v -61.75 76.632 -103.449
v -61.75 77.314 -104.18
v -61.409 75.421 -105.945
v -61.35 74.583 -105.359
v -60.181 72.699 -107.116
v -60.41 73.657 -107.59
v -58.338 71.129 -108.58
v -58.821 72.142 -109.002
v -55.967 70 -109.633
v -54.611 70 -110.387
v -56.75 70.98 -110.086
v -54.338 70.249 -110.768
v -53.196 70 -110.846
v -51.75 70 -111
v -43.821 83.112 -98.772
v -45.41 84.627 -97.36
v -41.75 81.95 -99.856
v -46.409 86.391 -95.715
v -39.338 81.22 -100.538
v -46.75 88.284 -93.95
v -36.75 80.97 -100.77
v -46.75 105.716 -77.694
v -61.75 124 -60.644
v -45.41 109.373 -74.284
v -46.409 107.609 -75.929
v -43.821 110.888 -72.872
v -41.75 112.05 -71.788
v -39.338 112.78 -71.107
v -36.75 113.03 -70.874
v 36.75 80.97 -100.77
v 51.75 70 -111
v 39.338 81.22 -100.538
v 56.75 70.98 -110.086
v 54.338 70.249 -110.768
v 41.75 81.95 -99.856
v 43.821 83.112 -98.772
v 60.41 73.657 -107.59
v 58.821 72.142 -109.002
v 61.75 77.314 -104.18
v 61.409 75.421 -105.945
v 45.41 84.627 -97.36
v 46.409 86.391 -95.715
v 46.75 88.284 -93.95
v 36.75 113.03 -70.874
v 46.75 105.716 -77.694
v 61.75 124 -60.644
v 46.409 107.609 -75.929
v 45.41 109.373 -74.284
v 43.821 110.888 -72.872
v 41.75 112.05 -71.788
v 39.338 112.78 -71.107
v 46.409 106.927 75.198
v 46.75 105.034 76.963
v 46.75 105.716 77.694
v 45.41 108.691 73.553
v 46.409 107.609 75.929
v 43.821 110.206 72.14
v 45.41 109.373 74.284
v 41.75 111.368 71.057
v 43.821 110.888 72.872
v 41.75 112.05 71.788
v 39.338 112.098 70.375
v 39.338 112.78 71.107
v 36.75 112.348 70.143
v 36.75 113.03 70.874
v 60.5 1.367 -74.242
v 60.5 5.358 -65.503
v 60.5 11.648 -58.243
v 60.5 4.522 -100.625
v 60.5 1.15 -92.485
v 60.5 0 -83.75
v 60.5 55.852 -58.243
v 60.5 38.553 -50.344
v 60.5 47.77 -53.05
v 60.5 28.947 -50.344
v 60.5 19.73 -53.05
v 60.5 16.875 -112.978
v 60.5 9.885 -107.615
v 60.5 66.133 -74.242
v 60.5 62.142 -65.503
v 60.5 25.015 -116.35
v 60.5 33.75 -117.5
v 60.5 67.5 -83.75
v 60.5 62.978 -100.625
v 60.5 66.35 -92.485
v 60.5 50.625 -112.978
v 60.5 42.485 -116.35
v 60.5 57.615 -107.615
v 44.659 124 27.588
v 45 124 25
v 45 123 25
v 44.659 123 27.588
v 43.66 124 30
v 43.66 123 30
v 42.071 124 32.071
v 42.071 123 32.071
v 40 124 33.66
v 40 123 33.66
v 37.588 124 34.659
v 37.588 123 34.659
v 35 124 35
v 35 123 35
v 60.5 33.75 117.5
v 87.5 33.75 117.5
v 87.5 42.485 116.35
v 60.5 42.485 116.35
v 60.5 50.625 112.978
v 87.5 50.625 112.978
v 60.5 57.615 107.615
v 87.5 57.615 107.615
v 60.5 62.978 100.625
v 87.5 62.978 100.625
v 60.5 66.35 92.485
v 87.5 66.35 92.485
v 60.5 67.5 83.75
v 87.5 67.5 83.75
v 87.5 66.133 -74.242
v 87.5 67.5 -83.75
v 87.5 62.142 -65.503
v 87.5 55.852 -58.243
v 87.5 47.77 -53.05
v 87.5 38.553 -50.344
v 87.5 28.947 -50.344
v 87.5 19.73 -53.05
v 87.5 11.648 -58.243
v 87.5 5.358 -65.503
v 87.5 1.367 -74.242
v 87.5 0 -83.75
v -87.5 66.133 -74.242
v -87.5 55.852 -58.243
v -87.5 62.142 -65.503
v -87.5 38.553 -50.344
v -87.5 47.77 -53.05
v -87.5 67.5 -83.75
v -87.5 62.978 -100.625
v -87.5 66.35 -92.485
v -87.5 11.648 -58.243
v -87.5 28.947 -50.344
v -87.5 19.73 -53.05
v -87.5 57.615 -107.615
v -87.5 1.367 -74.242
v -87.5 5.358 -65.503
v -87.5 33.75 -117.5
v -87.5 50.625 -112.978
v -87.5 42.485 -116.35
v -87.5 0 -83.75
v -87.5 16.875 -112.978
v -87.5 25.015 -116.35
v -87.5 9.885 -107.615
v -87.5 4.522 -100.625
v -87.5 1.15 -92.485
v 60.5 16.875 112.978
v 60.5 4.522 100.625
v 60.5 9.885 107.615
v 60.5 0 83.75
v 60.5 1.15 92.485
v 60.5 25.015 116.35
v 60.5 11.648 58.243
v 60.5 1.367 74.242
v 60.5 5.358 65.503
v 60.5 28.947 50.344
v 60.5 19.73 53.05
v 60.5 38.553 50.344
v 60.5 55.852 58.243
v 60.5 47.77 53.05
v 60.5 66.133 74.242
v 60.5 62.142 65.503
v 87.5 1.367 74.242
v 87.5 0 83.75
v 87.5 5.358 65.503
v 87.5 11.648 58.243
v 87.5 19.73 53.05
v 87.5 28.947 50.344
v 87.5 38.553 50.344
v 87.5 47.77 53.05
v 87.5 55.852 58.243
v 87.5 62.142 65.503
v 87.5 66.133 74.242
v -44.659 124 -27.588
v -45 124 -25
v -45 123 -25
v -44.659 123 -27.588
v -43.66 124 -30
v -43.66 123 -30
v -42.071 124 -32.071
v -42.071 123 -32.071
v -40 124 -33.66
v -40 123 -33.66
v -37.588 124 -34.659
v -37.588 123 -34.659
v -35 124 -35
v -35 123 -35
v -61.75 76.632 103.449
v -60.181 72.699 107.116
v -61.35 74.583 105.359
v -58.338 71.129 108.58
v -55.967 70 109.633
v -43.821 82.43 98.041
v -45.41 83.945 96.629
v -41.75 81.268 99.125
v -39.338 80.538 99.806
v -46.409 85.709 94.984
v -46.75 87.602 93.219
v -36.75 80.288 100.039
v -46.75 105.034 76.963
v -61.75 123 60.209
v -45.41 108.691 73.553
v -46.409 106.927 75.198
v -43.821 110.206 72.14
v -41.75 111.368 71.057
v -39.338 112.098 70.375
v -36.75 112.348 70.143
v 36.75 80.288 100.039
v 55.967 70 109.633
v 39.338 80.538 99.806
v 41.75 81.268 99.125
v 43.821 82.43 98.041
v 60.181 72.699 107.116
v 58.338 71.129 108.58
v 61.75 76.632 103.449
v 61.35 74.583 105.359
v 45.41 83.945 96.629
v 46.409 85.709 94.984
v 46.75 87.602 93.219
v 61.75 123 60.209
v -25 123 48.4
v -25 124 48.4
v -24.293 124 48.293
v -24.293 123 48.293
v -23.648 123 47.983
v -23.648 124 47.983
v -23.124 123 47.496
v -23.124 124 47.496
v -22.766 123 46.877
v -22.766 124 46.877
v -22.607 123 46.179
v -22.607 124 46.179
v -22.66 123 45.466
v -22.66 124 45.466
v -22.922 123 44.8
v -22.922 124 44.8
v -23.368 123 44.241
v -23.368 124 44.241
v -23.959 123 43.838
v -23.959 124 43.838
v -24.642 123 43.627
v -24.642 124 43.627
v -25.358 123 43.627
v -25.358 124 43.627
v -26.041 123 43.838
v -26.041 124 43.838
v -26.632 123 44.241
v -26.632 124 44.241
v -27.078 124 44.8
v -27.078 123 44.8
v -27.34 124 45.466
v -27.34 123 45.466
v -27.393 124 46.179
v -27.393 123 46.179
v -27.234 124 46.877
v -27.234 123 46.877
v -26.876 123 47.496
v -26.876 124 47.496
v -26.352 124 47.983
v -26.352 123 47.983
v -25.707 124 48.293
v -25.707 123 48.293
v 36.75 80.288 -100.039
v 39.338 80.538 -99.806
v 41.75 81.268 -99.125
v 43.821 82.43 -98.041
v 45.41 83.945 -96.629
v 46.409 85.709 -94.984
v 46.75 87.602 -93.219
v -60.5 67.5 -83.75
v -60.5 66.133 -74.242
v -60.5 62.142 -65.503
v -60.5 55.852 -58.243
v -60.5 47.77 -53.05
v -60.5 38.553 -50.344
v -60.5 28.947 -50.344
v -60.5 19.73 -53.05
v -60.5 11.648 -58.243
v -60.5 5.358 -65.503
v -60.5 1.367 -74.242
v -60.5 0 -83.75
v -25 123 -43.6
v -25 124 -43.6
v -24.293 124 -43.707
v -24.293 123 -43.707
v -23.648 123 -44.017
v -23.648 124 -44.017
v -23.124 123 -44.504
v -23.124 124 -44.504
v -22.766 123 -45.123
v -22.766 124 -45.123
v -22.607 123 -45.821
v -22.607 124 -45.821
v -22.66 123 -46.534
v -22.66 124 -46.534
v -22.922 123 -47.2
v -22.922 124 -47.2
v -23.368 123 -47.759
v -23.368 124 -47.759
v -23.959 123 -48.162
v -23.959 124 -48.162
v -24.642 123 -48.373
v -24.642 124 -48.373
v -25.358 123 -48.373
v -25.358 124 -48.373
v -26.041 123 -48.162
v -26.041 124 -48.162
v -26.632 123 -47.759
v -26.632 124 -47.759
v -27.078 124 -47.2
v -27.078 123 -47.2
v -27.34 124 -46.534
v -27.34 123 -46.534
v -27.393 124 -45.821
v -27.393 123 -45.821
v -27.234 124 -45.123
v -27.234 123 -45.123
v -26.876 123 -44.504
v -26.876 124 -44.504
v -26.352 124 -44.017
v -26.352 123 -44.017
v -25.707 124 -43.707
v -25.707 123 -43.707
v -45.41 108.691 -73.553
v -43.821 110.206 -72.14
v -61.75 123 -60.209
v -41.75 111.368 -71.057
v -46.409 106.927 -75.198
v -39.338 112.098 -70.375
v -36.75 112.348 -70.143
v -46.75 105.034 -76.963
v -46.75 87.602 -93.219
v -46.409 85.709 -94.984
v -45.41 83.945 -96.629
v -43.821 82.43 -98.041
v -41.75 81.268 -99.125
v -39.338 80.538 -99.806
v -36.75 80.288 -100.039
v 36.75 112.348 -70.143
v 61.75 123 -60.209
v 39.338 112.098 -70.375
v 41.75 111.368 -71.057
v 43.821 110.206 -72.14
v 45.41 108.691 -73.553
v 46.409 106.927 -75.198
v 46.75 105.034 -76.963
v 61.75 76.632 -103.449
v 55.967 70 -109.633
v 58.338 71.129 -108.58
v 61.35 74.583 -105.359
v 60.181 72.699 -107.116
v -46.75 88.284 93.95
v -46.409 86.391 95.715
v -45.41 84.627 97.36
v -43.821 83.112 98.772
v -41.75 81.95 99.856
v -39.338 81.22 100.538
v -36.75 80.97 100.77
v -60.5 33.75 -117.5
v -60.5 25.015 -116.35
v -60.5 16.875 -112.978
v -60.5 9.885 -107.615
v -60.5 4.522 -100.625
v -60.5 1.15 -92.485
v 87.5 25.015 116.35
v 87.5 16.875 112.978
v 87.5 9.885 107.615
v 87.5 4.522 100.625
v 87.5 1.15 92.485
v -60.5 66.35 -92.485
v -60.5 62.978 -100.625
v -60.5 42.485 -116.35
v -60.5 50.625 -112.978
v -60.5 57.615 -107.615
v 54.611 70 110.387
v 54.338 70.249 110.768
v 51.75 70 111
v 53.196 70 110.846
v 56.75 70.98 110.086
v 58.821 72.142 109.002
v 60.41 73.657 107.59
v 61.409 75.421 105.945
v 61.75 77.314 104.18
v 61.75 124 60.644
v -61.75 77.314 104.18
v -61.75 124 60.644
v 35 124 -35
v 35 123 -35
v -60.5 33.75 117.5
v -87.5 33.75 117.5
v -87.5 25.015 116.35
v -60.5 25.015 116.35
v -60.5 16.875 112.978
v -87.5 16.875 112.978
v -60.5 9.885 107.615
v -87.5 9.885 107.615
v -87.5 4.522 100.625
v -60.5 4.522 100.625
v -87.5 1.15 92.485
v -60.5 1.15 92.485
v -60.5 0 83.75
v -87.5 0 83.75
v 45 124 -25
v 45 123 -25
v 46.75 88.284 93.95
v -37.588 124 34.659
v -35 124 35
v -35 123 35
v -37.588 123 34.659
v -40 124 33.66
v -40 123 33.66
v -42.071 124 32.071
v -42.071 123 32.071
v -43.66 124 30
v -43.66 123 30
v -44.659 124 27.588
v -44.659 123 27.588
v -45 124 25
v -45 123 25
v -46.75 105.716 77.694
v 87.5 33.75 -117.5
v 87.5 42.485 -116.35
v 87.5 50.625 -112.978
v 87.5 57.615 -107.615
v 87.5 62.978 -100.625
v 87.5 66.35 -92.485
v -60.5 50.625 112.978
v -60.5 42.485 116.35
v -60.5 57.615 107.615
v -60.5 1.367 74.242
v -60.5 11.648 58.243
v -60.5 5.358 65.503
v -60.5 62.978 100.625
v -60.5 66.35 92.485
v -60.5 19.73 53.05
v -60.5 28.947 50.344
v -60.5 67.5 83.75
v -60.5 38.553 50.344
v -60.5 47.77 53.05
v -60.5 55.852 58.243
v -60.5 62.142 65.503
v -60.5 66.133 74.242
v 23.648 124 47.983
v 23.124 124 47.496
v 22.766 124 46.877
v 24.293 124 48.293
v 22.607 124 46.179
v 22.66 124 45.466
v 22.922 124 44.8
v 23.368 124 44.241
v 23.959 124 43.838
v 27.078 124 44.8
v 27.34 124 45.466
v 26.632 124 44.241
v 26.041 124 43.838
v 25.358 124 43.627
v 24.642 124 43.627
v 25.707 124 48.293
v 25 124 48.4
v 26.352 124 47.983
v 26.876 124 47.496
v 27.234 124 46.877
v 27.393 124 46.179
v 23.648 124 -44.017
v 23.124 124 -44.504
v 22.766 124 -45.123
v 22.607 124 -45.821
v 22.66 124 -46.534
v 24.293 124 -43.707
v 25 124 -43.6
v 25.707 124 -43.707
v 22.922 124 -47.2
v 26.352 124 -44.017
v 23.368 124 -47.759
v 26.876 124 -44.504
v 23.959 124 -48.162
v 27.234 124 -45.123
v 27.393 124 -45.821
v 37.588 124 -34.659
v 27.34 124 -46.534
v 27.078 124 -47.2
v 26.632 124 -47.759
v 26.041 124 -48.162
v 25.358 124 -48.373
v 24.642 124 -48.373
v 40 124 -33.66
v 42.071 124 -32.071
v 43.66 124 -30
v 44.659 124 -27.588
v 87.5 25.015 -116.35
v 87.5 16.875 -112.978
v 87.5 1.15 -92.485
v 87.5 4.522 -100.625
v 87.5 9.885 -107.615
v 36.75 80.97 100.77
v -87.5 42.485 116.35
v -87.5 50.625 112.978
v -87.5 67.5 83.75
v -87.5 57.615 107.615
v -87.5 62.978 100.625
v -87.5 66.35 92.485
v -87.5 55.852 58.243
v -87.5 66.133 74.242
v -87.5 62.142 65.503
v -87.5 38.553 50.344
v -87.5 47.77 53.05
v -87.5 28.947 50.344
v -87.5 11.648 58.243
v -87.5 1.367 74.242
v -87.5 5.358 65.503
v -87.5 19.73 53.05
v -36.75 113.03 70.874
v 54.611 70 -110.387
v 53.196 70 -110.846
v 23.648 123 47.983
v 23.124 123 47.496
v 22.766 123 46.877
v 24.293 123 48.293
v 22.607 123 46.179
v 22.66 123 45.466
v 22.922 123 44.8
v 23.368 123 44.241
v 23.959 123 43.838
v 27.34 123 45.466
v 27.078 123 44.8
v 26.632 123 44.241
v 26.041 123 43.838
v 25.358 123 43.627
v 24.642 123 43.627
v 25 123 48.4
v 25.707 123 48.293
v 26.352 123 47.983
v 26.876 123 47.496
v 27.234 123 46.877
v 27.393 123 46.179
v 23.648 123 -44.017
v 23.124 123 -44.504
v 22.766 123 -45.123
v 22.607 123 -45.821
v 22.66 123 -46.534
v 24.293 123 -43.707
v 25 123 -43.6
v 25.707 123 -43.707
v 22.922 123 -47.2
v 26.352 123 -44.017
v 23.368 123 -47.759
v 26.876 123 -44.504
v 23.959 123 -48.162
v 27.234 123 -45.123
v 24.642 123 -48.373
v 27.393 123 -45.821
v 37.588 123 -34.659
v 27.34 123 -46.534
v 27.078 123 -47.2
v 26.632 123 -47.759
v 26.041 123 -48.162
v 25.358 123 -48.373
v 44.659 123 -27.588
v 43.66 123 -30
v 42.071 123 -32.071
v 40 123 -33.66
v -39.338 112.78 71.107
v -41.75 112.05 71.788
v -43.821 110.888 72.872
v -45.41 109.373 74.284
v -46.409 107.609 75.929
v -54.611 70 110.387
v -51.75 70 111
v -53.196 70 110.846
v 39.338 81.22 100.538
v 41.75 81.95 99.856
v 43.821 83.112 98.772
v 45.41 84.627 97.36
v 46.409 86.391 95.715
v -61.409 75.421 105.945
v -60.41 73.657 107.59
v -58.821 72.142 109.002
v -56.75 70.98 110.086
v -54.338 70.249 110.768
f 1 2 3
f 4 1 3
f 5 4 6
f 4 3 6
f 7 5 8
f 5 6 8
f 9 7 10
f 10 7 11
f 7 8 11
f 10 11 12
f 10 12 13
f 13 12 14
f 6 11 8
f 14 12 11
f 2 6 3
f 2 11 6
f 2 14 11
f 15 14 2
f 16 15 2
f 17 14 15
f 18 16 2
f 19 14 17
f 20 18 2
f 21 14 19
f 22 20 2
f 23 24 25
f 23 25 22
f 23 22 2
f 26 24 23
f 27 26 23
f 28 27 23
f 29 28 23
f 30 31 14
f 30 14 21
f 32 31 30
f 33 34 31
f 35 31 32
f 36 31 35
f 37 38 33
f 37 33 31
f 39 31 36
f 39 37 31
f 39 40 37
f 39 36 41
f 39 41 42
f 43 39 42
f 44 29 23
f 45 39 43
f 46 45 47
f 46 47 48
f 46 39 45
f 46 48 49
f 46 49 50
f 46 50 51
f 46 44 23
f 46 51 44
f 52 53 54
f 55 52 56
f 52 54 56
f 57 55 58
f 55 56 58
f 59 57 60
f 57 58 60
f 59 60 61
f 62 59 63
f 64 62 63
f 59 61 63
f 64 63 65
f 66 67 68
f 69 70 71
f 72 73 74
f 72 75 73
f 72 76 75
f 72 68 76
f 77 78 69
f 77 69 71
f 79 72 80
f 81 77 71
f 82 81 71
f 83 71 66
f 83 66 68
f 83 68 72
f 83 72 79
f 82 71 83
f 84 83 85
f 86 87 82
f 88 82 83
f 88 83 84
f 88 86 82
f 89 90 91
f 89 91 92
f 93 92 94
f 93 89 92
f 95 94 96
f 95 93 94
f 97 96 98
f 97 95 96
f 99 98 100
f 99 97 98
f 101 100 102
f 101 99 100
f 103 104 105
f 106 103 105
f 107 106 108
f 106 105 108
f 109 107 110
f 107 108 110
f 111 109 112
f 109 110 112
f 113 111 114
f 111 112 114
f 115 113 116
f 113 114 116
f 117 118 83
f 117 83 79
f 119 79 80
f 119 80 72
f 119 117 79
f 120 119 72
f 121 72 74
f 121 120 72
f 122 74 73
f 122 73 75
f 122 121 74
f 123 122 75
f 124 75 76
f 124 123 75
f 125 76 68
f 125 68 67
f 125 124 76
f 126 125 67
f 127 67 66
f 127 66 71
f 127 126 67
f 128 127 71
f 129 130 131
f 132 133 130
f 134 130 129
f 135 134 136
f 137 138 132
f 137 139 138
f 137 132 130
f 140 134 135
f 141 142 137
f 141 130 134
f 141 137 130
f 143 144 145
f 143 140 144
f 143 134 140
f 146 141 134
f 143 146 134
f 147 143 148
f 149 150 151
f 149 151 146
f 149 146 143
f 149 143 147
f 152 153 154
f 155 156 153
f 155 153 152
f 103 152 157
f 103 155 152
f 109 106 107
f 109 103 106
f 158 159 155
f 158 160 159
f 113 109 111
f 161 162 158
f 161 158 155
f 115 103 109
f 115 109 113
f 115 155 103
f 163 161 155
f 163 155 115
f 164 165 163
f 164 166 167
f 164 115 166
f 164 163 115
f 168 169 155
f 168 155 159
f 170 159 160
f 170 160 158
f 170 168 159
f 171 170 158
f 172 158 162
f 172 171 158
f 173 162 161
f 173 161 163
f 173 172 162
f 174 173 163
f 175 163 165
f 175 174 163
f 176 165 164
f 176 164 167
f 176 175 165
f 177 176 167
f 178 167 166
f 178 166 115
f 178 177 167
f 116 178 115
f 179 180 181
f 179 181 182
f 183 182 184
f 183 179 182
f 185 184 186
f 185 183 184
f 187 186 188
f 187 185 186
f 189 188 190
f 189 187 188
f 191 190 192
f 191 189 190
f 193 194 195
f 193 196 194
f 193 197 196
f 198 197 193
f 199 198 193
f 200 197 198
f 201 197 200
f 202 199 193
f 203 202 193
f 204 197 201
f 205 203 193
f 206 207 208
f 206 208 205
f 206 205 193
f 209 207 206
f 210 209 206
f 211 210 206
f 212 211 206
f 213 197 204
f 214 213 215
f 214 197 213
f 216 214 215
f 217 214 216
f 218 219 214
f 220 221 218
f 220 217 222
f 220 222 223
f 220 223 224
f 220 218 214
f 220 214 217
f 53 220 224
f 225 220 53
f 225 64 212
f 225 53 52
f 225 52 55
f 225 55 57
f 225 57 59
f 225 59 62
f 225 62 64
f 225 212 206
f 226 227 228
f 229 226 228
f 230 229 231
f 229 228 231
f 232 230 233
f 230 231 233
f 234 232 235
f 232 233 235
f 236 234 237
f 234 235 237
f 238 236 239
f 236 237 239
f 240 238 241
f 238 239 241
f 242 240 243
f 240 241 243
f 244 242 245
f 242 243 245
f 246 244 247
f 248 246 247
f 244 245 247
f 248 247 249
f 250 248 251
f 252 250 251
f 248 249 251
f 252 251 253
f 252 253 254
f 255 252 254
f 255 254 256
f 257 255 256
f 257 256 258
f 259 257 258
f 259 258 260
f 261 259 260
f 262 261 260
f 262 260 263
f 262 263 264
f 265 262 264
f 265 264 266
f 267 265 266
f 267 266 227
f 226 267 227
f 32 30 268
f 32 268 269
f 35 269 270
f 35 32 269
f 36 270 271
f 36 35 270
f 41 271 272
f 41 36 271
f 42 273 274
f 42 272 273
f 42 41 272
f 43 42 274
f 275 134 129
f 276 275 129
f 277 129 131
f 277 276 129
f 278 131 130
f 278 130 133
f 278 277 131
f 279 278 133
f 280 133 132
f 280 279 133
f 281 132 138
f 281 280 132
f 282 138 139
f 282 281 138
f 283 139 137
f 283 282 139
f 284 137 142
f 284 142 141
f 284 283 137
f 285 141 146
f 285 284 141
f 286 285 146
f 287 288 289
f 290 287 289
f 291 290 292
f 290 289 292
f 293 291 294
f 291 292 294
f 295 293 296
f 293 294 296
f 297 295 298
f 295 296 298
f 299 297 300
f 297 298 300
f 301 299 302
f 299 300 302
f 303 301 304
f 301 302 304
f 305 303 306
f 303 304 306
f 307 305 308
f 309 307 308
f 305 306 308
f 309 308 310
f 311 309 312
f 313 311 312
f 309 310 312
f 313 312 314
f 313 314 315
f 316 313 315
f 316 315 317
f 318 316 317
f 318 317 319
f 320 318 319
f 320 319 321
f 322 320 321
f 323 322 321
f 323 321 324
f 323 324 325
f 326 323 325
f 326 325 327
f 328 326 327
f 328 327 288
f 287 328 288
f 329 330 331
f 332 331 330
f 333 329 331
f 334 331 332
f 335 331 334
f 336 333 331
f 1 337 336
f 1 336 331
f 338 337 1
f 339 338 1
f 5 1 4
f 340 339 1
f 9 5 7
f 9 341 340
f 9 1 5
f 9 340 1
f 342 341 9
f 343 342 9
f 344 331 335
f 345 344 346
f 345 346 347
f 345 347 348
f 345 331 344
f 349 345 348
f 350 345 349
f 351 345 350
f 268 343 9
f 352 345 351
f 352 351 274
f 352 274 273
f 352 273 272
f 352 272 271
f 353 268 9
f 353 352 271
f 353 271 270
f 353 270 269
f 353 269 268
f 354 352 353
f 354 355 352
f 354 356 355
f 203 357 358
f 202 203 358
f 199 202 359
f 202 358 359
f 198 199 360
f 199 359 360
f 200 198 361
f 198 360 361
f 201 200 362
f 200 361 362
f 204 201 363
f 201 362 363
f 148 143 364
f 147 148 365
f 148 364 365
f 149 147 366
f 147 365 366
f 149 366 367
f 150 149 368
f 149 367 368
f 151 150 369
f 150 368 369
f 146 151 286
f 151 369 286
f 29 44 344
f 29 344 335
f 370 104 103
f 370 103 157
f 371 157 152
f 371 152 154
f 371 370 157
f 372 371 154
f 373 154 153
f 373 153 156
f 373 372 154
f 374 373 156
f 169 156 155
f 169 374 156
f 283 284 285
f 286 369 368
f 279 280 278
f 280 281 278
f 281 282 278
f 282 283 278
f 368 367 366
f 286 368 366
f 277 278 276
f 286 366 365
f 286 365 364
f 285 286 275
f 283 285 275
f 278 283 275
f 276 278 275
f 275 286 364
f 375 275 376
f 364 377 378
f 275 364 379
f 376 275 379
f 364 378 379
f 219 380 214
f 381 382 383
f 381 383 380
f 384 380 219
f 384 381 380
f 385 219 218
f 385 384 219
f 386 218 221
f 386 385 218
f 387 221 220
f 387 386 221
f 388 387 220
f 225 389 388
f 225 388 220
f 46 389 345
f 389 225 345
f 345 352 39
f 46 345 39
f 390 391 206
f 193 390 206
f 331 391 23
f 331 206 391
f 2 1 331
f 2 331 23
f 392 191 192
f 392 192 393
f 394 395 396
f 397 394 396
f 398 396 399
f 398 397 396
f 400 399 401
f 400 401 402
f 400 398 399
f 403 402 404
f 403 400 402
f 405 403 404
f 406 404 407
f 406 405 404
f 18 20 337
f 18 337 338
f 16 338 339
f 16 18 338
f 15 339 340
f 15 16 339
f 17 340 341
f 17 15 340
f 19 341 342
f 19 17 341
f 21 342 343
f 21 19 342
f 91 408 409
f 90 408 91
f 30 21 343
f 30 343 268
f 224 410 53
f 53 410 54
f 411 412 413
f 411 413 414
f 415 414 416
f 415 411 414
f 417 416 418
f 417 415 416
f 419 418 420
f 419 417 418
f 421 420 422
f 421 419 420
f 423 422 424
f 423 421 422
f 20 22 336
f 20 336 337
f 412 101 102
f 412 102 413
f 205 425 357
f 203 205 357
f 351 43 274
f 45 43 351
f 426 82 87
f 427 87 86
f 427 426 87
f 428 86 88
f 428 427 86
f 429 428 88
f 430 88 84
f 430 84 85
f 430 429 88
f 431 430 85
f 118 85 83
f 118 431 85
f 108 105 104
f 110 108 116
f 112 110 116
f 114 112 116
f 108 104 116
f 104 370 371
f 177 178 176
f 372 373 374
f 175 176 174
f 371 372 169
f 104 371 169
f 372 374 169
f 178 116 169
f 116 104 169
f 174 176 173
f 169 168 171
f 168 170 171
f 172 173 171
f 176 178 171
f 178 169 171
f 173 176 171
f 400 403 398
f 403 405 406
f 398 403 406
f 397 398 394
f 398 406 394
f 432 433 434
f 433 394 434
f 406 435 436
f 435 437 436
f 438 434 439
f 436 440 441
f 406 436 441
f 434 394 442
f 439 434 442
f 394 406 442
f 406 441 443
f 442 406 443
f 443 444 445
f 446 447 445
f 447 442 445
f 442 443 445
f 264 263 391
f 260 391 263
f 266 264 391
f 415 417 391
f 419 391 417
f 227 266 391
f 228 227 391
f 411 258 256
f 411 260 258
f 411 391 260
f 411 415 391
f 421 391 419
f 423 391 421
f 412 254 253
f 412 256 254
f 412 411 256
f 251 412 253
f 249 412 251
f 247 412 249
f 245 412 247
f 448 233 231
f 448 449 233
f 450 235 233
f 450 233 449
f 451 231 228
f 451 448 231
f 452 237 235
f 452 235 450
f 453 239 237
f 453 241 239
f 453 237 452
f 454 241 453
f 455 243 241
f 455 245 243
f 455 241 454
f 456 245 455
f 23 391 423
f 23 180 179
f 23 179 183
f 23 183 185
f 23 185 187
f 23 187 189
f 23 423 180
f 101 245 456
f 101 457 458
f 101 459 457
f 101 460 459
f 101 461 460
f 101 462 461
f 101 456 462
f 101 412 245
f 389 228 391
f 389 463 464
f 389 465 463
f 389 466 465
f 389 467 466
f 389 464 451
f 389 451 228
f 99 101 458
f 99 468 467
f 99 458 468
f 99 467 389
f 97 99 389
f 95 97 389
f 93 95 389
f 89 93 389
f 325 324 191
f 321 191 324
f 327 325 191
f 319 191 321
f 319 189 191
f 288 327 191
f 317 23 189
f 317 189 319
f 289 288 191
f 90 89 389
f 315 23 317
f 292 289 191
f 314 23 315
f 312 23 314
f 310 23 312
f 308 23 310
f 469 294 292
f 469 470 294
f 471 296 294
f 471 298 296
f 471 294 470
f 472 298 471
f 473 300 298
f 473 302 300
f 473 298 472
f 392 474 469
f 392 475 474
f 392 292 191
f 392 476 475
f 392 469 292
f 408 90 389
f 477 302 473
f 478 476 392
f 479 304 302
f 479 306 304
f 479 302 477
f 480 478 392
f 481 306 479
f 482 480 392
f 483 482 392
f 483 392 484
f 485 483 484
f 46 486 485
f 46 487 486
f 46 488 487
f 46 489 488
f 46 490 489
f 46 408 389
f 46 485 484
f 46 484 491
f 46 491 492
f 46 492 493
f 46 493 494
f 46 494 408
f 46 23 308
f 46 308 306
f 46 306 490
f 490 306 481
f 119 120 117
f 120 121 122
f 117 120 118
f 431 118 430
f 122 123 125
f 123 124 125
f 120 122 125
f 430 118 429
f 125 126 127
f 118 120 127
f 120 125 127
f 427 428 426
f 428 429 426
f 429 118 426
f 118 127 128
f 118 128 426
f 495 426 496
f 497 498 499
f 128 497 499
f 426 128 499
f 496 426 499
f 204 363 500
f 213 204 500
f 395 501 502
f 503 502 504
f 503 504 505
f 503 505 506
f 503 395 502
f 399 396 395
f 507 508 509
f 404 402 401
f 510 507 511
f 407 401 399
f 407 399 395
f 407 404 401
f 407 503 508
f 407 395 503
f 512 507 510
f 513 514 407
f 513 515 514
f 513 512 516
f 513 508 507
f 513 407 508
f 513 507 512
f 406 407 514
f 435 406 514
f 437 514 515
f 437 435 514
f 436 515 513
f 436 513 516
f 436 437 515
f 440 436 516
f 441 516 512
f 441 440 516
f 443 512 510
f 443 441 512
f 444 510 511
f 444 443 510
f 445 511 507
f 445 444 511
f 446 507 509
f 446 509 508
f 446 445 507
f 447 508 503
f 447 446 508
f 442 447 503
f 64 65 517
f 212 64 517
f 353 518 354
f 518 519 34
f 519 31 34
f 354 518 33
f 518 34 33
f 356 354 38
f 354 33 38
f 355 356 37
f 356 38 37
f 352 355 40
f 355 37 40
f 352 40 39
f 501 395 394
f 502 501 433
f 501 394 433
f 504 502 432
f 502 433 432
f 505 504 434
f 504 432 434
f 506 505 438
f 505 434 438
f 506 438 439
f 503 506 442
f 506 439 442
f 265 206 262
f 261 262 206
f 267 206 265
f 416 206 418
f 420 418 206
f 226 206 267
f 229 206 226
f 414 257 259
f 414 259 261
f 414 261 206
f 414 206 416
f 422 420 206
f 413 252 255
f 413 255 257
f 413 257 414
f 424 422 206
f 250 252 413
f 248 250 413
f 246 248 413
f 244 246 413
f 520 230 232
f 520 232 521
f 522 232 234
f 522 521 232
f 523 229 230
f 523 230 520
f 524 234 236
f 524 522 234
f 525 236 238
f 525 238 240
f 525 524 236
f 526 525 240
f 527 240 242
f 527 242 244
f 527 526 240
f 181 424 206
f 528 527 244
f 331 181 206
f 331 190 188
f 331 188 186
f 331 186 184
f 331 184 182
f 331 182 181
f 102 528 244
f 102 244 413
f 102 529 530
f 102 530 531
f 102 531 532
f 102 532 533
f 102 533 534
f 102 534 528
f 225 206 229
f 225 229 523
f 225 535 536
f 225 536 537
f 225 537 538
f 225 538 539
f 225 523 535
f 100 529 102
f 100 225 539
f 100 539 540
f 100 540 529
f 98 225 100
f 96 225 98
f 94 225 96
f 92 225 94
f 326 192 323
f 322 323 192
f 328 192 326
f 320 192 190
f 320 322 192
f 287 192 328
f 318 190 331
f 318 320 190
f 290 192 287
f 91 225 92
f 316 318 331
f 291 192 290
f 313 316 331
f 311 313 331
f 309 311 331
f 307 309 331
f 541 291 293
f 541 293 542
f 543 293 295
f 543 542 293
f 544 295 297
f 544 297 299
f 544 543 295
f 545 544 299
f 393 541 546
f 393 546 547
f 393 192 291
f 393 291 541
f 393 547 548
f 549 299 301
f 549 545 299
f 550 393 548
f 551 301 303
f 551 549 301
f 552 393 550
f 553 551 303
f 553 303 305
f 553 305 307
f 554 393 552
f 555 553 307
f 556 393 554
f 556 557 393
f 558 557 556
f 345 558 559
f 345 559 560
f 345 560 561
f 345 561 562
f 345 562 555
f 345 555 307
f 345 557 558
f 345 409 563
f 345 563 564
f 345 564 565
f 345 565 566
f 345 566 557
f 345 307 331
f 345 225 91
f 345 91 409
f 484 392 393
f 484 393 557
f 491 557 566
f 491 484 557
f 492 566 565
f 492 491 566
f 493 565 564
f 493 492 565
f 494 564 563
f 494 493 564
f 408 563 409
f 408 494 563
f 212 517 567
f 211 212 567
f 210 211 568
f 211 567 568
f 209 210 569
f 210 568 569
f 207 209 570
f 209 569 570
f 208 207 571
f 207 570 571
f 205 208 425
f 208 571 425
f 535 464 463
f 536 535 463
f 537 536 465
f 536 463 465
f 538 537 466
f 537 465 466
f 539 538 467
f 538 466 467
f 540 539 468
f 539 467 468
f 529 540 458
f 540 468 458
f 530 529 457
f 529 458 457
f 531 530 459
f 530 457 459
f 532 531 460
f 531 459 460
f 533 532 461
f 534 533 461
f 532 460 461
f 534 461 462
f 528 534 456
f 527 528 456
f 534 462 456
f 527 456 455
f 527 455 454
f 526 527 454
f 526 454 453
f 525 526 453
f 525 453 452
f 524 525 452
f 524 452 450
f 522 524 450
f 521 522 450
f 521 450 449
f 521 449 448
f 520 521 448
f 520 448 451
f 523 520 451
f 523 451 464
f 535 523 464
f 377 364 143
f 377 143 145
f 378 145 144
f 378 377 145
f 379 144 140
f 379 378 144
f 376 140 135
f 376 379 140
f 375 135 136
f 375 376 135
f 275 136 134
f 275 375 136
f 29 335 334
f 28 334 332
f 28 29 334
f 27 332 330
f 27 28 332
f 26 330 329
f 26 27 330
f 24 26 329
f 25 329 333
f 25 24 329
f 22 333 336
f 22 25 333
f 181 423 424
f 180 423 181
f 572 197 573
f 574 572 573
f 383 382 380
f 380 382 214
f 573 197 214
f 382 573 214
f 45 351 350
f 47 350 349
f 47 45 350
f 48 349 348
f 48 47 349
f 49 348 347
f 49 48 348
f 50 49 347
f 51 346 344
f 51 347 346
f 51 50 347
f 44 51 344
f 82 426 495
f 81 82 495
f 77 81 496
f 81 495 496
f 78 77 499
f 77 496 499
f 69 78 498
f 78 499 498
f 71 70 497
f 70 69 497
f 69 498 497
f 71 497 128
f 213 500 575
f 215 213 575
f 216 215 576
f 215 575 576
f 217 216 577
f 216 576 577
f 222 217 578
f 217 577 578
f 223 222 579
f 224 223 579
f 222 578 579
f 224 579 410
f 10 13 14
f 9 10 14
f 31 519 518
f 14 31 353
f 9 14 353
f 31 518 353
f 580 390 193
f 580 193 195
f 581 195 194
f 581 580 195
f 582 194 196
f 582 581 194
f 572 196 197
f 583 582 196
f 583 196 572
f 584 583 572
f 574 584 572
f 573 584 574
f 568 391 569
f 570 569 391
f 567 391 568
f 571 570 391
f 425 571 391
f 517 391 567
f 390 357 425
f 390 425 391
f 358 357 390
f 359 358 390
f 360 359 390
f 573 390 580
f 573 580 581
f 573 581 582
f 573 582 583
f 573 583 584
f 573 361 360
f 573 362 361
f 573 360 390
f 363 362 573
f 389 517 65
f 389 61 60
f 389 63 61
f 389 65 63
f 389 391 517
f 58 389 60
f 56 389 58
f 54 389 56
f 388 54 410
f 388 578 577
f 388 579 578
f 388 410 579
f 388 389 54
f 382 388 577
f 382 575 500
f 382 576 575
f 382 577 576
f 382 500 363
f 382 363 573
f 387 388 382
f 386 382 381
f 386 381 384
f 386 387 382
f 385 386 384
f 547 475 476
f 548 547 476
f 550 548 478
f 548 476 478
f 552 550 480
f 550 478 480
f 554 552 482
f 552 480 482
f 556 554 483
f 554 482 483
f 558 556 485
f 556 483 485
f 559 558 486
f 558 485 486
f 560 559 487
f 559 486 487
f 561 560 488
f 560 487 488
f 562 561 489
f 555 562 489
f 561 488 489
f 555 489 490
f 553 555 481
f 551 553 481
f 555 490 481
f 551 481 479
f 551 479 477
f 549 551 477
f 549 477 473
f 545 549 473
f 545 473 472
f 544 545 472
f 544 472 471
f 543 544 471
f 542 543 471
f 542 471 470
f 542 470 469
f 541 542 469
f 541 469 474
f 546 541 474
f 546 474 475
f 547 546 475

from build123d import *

# Parameters (mm, degrees)
ESBO_O1_W                  = 175
ESBO_O1_H                  = 235
RESSALTO_EXTRUS_O1_DEPTH   = 67.5
FILETE1_R                  = 33.75
CORTE_EXTRUS_O1_DEPTH      = 222.331199789
CORTE_EXTRUS_O2_DEPTH      = 162.303285769
CORTE_EXTRUS_O2_DEPTH_BACK = 162.303285769
ESBO_O3_W                  = 121
ESBO_O3_H                  = 67.5
ESBO_O4_W                  = 123.5
ESBO_O4_H                  = 222
RESSALTO_EXTRUS_O2_DEPTH   = 54
CORTE_EXTRUS_O3_DEPTH      = 227.843145147
ESBO_O7_R                  = 2.4
CORTE_EXTRUS_O4_DEPTH      = 192.933582262
CORTE_EXTRUS_O5_DEPTH      = 10


with BuildPart() as part:
    # Esboço1 → Ressalto-extrusão1 (new body)
    with BuildSketch(Plane(origin=(0, 0, 0), x_dir=(1, 0, 0), z_dir=(0, 1, 0))):
        Rectangle(ESBO_O1_W, ESBO_O1_H)
    extrude(amount=RESSALTO_EXTRUS_O1_DEPTH)

    # Filete1
    filete1_edges = [part.edges().sort_by_distance(p)[0] for p in [
        (0, 0, -117.5),
        (0, 67.5, -117.5),
        (0, 0, 117.5),
        (0, 67.5, 117.5),
    ]]
    fillet(filete1_edges, radius=FILETE1_R - 0.0001)  # a hair under: the kernel refuses the full size

    # Esboço2 → Corte-extrusão1 (cut, through all)
    with BuildSketch(Plane(origin=(87.5, 0, 0), x_dir=(0, 0, -1), z_dir=(1, 0, 0))):
        with BuildLine():
            Line((-83.75, 67.5), (83.75, 67.5))
            ThreePointArc((83.75, 67.5), (50, 33.75), (83.75, 0))
            Line((83.75, 0), (-83.75, 0))
            ThreePointArc((-83.75, 0), (-50, 33.75), (-83.75, 67.5))
        make_face()
    extrude(amount=-CORTE_EXTRUS_O1_DEPTH, mode=Mode.SUBTRACT)


with BuildPart() as corte_extrus_o1_piece_1:
    # of the separate pieces the step leaves, piece 1, a body of its own (corte_extrus_o1_pieces)
    add(part.part.solids().sort_by_distance((-87.5, 33.7499, -117.5))[0])


with BuildPart() as corte_extrus_o1_piece_2:
    # of the separate pieces the step leaves, piece 2, a body of its own (corte_extrus_o1_pieces)
    add(part.part.solids().sort_by_distance((-87.5, 33.7499, 117.5))[0])


with BuildPart() as corte_extrus_o2_tool:
    # Esboço3 → Corte-extrusão2 (new, two sides: drawn at the far end of the back side and taken through both)
    with BuildSketch(Plane.XY.offset(-CORTE_EXTRUS_O2_DEPTH_BACK)):
        with Locations((0, 33.75)):
            Rectangle(ESBO_O3_W, ESBO_O3_H)
    extrude(amount=CORTE_EXTRUS_O2_DEPTH + CORTE_EXTRUS_O2_DEPTH_BACK)


with BuildPart() as corte_extrus_o1_piece_1_1:
    add(corte_extrus_o1_piece_1.part)

    # Corte-extrusão2: cut by corte_extrus_o2_tool
    add(corte_extrus_o2_tool.part, mode=Mode.SUBTRACT)


with BuildPart() as corte_extrus_o1_piece_2_1:
    add(corte_extrus_o1_piece_2.part)

    # Corte-extrusão2: cut by corte_extrus_o2_tool
    add(corte_extrus_o2_tool.part, mode=Mode.SUBTRACT)


with BuildPart() as corte_extrus_o2_piece_1:
    # of the separate pieces the step leaves, piece 1, a body of its own (corte_extrus_o2_pieces)
    add(corte_extrus_o1_piece_1_1.part.solids().sort_by_distance((-87.5, 33.7499, -117.5))[0])


with BuildPart() as corte_extrus_o2_piece_2:
    # of the separate pieces the step leaves, piece 2, a body of its own (corte_extrus_o2_pieces)
    add(corte_extrus_o1_piece_1_1.part.solids().sort_by_distance((60.5, 33.7499, -117.5))[0])


with BuildPart() as corte_extrus_o2_piece_1_of_corte_extrus:
    # of the separate pieces the step leaves, piece 1, a body of its own (corte_extrus_o2_pieces_of_corte_extrus_o)
    add(corte_extrus_o1_piece_2_1.part.solids().sort_by_distance((87.5, 33.7499, 117.5))[0])


with BuildPart() as corte_extrus_o2_piece_2_of_corte_extrus:
    # of the separate pieces the step leaves, piece 2, a body of its own (corte_extrus_o2_pieces_of_corte_extrus_o)
    add(corte_extrus_o1_piece_2_1.part.solids().sort_by_distance((-87.5, 33.7499, 117.5))[0])


with BuildPart() as body_5:
    # Esboço4 → Ressalto-extrusão2 (new body)
    with BuildSketch(Plane(origin=(0, 70, 0), x_dir=(1, 0, 0), z_dir=(0, 1, 0))):
        Rectangle(ESBO_O4_W, ESBO_O4_H)
    extrude(amount=RESSALTO_EXTRUS_O2_DEPTH)

    # Esboço6 → Corte-extrusão3 (cut, through all)
    with BuildSketch(Plane(origin=(61.75, 0, 0), x_dir=(0, 0, -1), z_dir=(1, 0, 0))):
        Polygon((-111, 70), (-111, 124), (-60.644185349, 124), align=None)
        Polygon((111, 124), (111, 70), (60.644185349, 124), align=None)
        Polygon((-109.632672539, 70), (-60.209372974, 123), (60.209372974, 123), (109.632672539, 70), align=None)
    extrude(amount=-CORTE_EXTRUS_O3_DEPTH, mode=Mode.SUBTRACT)

    # Esboço7 → Corte-extrusão4 (cut, through all)
    with BuildSketch(Plane(origin=(0, 124, 0), x_dir=(1, 0, 0), z_dir=(0, 1, 0))):
        with Locations(Location((-25, -46, 0), (0, 0, 270))):
            Circle(ESBO_O7_R)
        with Locations(Location((25, -46, 0), (0, 0, 270))):
            Circle(ESBO_O7_R)
        with Locations(Location((-25, 46, 0), (0, 0, 270))):
            Circle(ESBO_O7_R)
        with Locations(Location((25, 46, 0), (0, 0, 270))):
            Circle(ESBO_O7_R)
        with BuildLine():
            Line((-35, 35), (35, 35))
            ThreePointArc((35, 35), (42.071067812, 32.071067812), (45, 25))
            Line((45, 25), (45, -25))
            ThreePointArc((45, -25), (42.071067812, -32.071067812), (35, -35))
            Line((35, -35), (-35, -35))
            ThreePointArc((-35, -35), (-42.071067812, -32.071067812), (-45, -25))
            Line((-45, -25), (-45, 25))
            ThreePointArc((-45, 25), (-42.071067812, 32.071067812), (-35, 35))
        make_face()
    extrude(amount=-CORTE_EXTRUS_O4_DEPTH, mode=Mode.SUBTRACT)

    # Esboço8 → Corte-extrusão5 (cut)
    with BuildSketch(Plane(origin=(0, 87.923328208, -94.286226052), x_dir=(-1, 0, 0), z_dir=(0, 0.6819983600624947, -0.731353701619174))):
        with BuildLine():
            Line((-36.75, 34.328624046), (36.75, 34.328624046))
            ThreePointArc((36.75, 34.328624046), (43.821067812, 31.399691858), (46.75, 24.328624046))
            Line((46.75, 24.328624046), (46.75, 0.492941146))
            ThreePointArc((46.75, 0.492941146), (43.821067812, -6.578126665), (36.75, -9.507058854))
            Line((36.75, -9.507058854), (-36.75, -9.507058854))
            ThreePointArc((-36.75, -9.507058854), (-43.821067812, -6.578126665), (-46.75, 0.492941146))
            Line((-46.75, 0.492941146), (-46.75, 24.328624046))
            ThreePointArc((-46.75, 24.328624046), (-43.821067812, 31.399691858), (-36.75, 34.328624046))
        make_face()
        with BuildLine():
            Line((-61.75, -24.507058854), (-51.75, -24.507058854))
            ThreePointArc((-51.75, -24.507058854), (-58.821067812, -21.578126665), (-61.75, -14.507058854))
            Line((-61.75, -14.507058854), (-61.75, -24.507058854))
        make_face()
        with BuildLine():
            ThreePointArc((61.75, -14.507058854), (58.821067812, -21.578126665), (51.75, -24.507058854))
            Line((51.75, -24.507058854), (61.75, -24.507058854))
            Line((61.75, -24.507058854), (61.75, -14.507058854))
        make_face()
    corte_extrus_o5 = extrude(amount=-CORTE_EXTRUS_O5_DEPTH, mode=Mode.SUBTRACT)

    # Espelhar1: Corte-extrusão5 across plane
    add(corte_extrus_o5.mirror(Plane.XY), mode=Mode.SUBTRACT)


solid = Compound([corte_extrus_o2_piece_1.part, corte_extrus_o2_piece_2.part, corte_extrus_o2_piece_1_of_corte_extrus.part, corte_extrus_o2_piece_2_of_corte_extrus.part, body_5.part])
